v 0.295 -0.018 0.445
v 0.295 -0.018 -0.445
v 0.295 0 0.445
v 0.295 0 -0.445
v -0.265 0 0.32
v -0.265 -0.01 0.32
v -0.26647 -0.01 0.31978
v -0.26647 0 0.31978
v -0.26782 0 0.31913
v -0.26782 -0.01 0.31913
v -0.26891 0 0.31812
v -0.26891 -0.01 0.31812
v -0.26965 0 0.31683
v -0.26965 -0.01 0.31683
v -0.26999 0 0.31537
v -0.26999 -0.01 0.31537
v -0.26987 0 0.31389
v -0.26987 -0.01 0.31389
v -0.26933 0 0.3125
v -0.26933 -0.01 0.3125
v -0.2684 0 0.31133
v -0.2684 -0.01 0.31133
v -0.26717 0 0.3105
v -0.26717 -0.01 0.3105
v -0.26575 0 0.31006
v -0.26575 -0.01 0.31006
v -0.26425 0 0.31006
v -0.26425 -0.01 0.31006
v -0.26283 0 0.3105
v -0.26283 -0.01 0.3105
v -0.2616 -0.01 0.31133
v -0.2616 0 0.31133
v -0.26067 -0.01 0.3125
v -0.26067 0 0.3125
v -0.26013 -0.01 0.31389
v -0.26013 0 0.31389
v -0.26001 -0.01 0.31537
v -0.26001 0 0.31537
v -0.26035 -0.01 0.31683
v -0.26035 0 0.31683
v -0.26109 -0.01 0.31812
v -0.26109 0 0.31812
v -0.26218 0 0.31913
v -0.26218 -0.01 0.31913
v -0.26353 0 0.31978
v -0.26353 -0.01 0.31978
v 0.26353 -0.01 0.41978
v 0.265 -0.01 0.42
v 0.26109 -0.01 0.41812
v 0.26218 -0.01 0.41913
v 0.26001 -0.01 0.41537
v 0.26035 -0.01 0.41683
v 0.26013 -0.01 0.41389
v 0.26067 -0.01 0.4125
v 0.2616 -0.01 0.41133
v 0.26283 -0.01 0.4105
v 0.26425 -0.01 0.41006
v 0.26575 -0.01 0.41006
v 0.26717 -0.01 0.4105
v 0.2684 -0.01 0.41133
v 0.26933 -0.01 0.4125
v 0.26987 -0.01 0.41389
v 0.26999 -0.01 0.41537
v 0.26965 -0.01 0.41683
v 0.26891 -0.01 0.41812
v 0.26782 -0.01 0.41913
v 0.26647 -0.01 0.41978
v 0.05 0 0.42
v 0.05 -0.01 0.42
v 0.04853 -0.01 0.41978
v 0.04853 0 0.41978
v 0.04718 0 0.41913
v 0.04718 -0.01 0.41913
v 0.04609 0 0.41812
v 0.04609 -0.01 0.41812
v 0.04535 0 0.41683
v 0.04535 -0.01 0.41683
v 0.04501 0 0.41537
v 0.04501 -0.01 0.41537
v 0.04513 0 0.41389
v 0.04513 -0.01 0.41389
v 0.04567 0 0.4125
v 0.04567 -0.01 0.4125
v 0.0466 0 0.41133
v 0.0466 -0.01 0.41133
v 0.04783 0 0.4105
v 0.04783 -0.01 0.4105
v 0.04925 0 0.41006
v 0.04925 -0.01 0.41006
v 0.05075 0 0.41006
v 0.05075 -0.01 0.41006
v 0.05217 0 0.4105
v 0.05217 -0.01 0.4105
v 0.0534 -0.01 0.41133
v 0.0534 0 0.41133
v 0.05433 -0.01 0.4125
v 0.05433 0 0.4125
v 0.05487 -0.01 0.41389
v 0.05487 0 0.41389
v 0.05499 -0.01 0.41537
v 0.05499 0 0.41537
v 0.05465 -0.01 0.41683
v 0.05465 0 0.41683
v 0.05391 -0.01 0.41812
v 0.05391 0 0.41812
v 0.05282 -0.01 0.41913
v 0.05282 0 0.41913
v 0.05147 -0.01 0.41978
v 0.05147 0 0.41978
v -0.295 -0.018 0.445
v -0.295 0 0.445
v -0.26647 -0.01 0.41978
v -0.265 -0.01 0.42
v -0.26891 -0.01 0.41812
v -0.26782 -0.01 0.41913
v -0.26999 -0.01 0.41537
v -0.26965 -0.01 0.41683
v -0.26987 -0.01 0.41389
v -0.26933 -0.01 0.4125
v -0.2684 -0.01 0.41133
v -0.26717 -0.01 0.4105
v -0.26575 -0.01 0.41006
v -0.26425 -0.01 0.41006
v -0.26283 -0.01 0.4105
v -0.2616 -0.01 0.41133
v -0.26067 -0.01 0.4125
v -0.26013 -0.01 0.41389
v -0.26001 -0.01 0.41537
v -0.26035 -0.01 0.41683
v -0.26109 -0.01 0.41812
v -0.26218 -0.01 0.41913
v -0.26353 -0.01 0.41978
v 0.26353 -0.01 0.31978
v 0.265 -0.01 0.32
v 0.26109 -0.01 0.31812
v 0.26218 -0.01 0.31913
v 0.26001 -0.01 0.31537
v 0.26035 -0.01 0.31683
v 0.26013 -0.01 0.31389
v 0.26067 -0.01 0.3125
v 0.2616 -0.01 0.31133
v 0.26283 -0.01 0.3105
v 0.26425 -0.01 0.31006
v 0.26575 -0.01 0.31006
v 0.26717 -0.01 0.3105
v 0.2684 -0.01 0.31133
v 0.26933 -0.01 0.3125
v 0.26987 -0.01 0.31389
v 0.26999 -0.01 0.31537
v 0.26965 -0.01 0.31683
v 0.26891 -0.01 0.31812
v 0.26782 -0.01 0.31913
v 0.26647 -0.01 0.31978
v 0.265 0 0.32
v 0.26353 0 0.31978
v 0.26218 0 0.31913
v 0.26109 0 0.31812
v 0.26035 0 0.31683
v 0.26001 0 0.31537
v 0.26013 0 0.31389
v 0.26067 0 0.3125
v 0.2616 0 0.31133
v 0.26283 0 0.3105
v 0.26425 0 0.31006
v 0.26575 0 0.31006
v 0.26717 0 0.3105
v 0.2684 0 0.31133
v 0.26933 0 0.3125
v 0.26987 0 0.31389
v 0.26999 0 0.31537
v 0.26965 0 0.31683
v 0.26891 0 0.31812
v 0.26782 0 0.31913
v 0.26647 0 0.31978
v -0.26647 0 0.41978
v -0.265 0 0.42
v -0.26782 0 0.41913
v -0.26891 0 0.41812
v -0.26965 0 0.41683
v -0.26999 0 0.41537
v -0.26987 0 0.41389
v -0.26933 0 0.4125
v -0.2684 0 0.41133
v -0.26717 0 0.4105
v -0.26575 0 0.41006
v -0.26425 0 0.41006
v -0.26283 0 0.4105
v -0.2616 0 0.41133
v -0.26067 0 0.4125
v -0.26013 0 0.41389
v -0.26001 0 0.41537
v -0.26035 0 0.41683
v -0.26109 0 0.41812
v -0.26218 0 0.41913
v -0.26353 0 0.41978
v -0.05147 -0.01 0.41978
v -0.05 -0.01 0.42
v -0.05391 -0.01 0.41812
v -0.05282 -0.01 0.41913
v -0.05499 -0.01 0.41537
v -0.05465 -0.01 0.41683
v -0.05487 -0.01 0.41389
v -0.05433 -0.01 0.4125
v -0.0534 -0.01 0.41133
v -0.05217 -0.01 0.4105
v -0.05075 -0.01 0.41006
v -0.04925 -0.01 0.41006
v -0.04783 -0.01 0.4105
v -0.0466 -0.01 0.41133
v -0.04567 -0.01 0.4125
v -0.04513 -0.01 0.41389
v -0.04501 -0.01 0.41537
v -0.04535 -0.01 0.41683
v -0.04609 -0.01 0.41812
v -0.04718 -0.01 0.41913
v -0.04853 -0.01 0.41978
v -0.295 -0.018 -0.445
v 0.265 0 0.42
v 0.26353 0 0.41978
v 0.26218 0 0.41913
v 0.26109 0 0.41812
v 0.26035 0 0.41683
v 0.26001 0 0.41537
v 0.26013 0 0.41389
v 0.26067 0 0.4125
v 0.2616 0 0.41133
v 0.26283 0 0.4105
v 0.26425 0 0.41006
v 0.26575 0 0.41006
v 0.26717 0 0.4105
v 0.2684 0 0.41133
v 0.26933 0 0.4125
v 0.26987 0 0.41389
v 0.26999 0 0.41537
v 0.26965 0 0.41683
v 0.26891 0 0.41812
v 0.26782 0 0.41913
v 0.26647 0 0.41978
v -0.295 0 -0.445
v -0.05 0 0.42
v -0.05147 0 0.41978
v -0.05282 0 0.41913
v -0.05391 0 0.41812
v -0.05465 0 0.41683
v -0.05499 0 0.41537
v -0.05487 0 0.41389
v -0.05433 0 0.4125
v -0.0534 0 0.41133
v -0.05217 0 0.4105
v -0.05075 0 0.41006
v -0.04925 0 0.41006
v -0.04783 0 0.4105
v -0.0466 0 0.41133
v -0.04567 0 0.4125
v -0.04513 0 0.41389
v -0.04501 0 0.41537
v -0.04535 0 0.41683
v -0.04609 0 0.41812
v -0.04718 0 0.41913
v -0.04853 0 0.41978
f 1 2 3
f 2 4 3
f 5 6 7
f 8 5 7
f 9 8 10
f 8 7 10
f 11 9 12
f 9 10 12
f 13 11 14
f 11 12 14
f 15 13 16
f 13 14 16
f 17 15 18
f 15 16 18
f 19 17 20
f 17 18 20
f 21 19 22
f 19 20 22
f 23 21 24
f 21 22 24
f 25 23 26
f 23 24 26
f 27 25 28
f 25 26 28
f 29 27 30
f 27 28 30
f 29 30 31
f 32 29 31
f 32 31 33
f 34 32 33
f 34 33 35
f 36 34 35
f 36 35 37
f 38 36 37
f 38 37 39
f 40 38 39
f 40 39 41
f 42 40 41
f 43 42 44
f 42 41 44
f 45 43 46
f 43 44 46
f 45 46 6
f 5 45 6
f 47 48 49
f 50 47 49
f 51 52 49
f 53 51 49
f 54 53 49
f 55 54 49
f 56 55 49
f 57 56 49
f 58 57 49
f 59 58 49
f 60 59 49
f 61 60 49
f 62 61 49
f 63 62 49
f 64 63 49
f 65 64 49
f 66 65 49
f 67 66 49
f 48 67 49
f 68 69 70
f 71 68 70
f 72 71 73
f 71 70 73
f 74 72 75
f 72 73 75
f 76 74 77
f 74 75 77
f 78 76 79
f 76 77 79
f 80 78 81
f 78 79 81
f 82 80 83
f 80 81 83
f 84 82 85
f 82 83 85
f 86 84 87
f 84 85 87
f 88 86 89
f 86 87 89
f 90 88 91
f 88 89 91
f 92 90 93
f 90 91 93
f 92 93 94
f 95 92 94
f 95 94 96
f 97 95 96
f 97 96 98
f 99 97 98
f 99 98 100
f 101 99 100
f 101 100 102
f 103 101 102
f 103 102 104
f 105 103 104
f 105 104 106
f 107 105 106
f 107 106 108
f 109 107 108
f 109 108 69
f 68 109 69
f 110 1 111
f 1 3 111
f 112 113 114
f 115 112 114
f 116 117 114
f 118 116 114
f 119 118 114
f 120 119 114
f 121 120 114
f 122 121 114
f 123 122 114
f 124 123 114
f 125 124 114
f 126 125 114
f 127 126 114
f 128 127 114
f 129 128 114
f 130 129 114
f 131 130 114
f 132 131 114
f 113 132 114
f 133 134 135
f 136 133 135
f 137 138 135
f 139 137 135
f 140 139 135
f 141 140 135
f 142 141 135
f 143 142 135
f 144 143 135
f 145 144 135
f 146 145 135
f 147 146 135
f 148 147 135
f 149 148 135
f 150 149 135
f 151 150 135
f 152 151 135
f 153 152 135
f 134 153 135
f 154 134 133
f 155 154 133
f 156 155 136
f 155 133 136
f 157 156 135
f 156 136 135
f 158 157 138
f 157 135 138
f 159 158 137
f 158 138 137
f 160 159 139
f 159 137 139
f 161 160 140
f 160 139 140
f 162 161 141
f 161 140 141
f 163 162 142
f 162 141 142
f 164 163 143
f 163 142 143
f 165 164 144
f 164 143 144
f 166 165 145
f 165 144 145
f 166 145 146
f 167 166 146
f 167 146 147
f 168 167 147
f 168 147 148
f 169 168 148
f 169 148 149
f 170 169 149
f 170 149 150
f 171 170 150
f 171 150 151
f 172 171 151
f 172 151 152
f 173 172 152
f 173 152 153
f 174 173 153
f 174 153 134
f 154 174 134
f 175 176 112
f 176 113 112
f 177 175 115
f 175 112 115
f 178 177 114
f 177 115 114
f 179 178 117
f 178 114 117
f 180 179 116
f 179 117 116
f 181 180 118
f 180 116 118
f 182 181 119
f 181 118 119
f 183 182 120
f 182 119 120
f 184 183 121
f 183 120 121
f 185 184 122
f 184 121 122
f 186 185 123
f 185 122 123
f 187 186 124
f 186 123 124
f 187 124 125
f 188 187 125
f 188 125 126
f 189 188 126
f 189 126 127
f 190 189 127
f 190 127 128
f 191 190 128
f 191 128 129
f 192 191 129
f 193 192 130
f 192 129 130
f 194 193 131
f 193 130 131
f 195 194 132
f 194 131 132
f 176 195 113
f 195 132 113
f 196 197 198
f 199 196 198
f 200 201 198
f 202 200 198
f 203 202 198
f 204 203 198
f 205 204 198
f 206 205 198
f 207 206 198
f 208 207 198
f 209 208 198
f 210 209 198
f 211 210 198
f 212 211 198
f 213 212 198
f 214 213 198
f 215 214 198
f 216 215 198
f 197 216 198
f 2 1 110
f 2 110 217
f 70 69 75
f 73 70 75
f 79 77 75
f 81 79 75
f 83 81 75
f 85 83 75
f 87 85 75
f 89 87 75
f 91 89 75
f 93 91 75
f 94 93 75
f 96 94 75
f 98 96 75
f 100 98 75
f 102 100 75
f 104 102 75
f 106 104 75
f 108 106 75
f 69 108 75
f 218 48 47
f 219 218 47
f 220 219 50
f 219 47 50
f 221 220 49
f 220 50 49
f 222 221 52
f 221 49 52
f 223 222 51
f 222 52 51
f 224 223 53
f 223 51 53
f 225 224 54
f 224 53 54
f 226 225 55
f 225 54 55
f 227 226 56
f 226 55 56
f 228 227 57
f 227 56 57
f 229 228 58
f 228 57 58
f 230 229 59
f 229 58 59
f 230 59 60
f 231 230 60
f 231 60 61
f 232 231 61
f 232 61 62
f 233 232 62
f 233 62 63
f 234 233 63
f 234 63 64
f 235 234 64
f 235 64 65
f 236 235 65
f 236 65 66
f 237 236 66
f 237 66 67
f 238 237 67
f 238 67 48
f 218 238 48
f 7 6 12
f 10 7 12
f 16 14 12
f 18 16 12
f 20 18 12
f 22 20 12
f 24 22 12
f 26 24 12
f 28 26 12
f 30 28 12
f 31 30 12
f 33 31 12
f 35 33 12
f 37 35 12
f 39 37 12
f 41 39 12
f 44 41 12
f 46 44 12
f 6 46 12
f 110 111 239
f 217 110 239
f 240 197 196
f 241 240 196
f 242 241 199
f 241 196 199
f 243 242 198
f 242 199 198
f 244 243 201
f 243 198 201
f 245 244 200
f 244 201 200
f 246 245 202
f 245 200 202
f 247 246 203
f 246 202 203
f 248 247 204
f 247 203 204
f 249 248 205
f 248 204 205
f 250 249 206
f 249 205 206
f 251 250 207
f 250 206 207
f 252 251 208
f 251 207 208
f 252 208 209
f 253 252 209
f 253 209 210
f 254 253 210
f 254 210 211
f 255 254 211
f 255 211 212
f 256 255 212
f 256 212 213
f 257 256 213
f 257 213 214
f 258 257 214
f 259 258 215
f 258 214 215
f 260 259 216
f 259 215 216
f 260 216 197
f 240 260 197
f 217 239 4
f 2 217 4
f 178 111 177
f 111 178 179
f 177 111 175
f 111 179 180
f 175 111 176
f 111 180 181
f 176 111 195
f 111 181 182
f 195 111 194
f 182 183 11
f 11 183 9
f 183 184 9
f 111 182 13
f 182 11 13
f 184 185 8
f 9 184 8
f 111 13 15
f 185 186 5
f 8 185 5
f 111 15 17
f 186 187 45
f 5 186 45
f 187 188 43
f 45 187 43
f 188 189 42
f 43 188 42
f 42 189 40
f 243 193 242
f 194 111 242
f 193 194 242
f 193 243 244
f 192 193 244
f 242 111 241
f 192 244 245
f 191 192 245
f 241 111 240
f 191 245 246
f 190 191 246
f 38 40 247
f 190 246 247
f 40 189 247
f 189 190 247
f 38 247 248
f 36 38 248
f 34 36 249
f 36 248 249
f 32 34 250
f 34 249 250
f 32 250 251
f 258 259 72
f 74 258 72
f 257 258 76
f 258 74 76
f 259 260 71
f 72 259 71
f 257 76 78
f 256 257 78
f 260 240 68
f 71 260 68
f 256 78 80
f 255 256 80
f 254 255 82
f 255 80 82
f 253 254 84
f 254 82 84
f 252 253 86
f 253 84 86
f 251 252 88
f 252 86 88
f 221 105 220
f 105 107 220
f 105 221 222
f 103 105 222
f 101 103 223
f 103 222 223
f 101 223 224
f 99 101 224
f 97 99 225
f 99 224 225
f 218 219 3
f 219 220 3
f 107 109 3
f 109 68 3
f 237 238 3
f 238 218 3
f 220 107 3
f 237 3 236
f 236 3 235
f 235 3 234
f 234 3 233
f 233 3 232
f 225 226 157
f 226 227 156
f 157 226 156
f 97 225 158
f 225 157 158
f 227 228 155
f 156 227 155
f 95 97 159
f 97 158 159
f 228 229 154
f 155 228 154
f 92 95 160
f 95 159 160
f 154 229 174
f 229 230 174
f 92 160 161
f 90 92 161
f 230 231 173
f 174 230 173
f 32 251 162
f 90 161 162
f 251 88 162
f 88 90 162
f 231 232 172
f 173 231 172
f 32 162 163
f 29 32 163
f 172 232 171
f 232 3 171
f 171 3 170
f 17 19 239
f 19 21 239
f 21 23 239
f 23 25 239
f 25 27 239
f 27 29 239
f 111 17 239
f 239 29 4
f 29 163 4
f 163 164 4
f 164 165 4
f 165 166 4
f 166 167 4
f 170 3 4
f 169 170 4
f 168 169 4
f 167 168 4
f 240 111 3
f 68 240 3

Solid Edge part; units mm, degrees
sketch "Sketch1" plane through (0, 0, 0) normal (0, -1, 0) x (1, 0, 0)
  line L0 (-0.295, -0.445) -> (0.295, -0.445)
  line L1 (0.295, -0.445) -> (0.295, 0.445)
  line L2 (0.295, 0.445) -> (-0.295, 0.445)
  line L3 (-0.295, 0.445) -> (-0.295, -0.445)
  dimension "D1" = 0.89
  dimension "D2" = 0.59
extrude "Protrusion1" add sketch "Sketch1" along normal blind 0.018
hole "Bohrung_1" at (-0.05, 0, 0.415) direction (0, -1, 0) diameter 0.01 depth 0.01
hole "Hole1" at (0.05, 0, 0.415) direction (0, -1, 0) diameter 0.01 depth 0.01
hole "Hole2" at (0.265, 0, 0.415) direction (0, -1, 0) diameter 0.01 depth 0.01
hole "Hole3" at (0.265, 0, 0.315) direction (0, -1, 0) diameter 0.01 depth 0.01
hole "Hole4" at (-0.265, 0, 0.315) direction (0, -1, 0) diameter 0.01 depth 0.01
hole "Hole5" at (-0.265, 0, 0.415) direction (0, -1, 0) diameter 0.01 depth 0.01
